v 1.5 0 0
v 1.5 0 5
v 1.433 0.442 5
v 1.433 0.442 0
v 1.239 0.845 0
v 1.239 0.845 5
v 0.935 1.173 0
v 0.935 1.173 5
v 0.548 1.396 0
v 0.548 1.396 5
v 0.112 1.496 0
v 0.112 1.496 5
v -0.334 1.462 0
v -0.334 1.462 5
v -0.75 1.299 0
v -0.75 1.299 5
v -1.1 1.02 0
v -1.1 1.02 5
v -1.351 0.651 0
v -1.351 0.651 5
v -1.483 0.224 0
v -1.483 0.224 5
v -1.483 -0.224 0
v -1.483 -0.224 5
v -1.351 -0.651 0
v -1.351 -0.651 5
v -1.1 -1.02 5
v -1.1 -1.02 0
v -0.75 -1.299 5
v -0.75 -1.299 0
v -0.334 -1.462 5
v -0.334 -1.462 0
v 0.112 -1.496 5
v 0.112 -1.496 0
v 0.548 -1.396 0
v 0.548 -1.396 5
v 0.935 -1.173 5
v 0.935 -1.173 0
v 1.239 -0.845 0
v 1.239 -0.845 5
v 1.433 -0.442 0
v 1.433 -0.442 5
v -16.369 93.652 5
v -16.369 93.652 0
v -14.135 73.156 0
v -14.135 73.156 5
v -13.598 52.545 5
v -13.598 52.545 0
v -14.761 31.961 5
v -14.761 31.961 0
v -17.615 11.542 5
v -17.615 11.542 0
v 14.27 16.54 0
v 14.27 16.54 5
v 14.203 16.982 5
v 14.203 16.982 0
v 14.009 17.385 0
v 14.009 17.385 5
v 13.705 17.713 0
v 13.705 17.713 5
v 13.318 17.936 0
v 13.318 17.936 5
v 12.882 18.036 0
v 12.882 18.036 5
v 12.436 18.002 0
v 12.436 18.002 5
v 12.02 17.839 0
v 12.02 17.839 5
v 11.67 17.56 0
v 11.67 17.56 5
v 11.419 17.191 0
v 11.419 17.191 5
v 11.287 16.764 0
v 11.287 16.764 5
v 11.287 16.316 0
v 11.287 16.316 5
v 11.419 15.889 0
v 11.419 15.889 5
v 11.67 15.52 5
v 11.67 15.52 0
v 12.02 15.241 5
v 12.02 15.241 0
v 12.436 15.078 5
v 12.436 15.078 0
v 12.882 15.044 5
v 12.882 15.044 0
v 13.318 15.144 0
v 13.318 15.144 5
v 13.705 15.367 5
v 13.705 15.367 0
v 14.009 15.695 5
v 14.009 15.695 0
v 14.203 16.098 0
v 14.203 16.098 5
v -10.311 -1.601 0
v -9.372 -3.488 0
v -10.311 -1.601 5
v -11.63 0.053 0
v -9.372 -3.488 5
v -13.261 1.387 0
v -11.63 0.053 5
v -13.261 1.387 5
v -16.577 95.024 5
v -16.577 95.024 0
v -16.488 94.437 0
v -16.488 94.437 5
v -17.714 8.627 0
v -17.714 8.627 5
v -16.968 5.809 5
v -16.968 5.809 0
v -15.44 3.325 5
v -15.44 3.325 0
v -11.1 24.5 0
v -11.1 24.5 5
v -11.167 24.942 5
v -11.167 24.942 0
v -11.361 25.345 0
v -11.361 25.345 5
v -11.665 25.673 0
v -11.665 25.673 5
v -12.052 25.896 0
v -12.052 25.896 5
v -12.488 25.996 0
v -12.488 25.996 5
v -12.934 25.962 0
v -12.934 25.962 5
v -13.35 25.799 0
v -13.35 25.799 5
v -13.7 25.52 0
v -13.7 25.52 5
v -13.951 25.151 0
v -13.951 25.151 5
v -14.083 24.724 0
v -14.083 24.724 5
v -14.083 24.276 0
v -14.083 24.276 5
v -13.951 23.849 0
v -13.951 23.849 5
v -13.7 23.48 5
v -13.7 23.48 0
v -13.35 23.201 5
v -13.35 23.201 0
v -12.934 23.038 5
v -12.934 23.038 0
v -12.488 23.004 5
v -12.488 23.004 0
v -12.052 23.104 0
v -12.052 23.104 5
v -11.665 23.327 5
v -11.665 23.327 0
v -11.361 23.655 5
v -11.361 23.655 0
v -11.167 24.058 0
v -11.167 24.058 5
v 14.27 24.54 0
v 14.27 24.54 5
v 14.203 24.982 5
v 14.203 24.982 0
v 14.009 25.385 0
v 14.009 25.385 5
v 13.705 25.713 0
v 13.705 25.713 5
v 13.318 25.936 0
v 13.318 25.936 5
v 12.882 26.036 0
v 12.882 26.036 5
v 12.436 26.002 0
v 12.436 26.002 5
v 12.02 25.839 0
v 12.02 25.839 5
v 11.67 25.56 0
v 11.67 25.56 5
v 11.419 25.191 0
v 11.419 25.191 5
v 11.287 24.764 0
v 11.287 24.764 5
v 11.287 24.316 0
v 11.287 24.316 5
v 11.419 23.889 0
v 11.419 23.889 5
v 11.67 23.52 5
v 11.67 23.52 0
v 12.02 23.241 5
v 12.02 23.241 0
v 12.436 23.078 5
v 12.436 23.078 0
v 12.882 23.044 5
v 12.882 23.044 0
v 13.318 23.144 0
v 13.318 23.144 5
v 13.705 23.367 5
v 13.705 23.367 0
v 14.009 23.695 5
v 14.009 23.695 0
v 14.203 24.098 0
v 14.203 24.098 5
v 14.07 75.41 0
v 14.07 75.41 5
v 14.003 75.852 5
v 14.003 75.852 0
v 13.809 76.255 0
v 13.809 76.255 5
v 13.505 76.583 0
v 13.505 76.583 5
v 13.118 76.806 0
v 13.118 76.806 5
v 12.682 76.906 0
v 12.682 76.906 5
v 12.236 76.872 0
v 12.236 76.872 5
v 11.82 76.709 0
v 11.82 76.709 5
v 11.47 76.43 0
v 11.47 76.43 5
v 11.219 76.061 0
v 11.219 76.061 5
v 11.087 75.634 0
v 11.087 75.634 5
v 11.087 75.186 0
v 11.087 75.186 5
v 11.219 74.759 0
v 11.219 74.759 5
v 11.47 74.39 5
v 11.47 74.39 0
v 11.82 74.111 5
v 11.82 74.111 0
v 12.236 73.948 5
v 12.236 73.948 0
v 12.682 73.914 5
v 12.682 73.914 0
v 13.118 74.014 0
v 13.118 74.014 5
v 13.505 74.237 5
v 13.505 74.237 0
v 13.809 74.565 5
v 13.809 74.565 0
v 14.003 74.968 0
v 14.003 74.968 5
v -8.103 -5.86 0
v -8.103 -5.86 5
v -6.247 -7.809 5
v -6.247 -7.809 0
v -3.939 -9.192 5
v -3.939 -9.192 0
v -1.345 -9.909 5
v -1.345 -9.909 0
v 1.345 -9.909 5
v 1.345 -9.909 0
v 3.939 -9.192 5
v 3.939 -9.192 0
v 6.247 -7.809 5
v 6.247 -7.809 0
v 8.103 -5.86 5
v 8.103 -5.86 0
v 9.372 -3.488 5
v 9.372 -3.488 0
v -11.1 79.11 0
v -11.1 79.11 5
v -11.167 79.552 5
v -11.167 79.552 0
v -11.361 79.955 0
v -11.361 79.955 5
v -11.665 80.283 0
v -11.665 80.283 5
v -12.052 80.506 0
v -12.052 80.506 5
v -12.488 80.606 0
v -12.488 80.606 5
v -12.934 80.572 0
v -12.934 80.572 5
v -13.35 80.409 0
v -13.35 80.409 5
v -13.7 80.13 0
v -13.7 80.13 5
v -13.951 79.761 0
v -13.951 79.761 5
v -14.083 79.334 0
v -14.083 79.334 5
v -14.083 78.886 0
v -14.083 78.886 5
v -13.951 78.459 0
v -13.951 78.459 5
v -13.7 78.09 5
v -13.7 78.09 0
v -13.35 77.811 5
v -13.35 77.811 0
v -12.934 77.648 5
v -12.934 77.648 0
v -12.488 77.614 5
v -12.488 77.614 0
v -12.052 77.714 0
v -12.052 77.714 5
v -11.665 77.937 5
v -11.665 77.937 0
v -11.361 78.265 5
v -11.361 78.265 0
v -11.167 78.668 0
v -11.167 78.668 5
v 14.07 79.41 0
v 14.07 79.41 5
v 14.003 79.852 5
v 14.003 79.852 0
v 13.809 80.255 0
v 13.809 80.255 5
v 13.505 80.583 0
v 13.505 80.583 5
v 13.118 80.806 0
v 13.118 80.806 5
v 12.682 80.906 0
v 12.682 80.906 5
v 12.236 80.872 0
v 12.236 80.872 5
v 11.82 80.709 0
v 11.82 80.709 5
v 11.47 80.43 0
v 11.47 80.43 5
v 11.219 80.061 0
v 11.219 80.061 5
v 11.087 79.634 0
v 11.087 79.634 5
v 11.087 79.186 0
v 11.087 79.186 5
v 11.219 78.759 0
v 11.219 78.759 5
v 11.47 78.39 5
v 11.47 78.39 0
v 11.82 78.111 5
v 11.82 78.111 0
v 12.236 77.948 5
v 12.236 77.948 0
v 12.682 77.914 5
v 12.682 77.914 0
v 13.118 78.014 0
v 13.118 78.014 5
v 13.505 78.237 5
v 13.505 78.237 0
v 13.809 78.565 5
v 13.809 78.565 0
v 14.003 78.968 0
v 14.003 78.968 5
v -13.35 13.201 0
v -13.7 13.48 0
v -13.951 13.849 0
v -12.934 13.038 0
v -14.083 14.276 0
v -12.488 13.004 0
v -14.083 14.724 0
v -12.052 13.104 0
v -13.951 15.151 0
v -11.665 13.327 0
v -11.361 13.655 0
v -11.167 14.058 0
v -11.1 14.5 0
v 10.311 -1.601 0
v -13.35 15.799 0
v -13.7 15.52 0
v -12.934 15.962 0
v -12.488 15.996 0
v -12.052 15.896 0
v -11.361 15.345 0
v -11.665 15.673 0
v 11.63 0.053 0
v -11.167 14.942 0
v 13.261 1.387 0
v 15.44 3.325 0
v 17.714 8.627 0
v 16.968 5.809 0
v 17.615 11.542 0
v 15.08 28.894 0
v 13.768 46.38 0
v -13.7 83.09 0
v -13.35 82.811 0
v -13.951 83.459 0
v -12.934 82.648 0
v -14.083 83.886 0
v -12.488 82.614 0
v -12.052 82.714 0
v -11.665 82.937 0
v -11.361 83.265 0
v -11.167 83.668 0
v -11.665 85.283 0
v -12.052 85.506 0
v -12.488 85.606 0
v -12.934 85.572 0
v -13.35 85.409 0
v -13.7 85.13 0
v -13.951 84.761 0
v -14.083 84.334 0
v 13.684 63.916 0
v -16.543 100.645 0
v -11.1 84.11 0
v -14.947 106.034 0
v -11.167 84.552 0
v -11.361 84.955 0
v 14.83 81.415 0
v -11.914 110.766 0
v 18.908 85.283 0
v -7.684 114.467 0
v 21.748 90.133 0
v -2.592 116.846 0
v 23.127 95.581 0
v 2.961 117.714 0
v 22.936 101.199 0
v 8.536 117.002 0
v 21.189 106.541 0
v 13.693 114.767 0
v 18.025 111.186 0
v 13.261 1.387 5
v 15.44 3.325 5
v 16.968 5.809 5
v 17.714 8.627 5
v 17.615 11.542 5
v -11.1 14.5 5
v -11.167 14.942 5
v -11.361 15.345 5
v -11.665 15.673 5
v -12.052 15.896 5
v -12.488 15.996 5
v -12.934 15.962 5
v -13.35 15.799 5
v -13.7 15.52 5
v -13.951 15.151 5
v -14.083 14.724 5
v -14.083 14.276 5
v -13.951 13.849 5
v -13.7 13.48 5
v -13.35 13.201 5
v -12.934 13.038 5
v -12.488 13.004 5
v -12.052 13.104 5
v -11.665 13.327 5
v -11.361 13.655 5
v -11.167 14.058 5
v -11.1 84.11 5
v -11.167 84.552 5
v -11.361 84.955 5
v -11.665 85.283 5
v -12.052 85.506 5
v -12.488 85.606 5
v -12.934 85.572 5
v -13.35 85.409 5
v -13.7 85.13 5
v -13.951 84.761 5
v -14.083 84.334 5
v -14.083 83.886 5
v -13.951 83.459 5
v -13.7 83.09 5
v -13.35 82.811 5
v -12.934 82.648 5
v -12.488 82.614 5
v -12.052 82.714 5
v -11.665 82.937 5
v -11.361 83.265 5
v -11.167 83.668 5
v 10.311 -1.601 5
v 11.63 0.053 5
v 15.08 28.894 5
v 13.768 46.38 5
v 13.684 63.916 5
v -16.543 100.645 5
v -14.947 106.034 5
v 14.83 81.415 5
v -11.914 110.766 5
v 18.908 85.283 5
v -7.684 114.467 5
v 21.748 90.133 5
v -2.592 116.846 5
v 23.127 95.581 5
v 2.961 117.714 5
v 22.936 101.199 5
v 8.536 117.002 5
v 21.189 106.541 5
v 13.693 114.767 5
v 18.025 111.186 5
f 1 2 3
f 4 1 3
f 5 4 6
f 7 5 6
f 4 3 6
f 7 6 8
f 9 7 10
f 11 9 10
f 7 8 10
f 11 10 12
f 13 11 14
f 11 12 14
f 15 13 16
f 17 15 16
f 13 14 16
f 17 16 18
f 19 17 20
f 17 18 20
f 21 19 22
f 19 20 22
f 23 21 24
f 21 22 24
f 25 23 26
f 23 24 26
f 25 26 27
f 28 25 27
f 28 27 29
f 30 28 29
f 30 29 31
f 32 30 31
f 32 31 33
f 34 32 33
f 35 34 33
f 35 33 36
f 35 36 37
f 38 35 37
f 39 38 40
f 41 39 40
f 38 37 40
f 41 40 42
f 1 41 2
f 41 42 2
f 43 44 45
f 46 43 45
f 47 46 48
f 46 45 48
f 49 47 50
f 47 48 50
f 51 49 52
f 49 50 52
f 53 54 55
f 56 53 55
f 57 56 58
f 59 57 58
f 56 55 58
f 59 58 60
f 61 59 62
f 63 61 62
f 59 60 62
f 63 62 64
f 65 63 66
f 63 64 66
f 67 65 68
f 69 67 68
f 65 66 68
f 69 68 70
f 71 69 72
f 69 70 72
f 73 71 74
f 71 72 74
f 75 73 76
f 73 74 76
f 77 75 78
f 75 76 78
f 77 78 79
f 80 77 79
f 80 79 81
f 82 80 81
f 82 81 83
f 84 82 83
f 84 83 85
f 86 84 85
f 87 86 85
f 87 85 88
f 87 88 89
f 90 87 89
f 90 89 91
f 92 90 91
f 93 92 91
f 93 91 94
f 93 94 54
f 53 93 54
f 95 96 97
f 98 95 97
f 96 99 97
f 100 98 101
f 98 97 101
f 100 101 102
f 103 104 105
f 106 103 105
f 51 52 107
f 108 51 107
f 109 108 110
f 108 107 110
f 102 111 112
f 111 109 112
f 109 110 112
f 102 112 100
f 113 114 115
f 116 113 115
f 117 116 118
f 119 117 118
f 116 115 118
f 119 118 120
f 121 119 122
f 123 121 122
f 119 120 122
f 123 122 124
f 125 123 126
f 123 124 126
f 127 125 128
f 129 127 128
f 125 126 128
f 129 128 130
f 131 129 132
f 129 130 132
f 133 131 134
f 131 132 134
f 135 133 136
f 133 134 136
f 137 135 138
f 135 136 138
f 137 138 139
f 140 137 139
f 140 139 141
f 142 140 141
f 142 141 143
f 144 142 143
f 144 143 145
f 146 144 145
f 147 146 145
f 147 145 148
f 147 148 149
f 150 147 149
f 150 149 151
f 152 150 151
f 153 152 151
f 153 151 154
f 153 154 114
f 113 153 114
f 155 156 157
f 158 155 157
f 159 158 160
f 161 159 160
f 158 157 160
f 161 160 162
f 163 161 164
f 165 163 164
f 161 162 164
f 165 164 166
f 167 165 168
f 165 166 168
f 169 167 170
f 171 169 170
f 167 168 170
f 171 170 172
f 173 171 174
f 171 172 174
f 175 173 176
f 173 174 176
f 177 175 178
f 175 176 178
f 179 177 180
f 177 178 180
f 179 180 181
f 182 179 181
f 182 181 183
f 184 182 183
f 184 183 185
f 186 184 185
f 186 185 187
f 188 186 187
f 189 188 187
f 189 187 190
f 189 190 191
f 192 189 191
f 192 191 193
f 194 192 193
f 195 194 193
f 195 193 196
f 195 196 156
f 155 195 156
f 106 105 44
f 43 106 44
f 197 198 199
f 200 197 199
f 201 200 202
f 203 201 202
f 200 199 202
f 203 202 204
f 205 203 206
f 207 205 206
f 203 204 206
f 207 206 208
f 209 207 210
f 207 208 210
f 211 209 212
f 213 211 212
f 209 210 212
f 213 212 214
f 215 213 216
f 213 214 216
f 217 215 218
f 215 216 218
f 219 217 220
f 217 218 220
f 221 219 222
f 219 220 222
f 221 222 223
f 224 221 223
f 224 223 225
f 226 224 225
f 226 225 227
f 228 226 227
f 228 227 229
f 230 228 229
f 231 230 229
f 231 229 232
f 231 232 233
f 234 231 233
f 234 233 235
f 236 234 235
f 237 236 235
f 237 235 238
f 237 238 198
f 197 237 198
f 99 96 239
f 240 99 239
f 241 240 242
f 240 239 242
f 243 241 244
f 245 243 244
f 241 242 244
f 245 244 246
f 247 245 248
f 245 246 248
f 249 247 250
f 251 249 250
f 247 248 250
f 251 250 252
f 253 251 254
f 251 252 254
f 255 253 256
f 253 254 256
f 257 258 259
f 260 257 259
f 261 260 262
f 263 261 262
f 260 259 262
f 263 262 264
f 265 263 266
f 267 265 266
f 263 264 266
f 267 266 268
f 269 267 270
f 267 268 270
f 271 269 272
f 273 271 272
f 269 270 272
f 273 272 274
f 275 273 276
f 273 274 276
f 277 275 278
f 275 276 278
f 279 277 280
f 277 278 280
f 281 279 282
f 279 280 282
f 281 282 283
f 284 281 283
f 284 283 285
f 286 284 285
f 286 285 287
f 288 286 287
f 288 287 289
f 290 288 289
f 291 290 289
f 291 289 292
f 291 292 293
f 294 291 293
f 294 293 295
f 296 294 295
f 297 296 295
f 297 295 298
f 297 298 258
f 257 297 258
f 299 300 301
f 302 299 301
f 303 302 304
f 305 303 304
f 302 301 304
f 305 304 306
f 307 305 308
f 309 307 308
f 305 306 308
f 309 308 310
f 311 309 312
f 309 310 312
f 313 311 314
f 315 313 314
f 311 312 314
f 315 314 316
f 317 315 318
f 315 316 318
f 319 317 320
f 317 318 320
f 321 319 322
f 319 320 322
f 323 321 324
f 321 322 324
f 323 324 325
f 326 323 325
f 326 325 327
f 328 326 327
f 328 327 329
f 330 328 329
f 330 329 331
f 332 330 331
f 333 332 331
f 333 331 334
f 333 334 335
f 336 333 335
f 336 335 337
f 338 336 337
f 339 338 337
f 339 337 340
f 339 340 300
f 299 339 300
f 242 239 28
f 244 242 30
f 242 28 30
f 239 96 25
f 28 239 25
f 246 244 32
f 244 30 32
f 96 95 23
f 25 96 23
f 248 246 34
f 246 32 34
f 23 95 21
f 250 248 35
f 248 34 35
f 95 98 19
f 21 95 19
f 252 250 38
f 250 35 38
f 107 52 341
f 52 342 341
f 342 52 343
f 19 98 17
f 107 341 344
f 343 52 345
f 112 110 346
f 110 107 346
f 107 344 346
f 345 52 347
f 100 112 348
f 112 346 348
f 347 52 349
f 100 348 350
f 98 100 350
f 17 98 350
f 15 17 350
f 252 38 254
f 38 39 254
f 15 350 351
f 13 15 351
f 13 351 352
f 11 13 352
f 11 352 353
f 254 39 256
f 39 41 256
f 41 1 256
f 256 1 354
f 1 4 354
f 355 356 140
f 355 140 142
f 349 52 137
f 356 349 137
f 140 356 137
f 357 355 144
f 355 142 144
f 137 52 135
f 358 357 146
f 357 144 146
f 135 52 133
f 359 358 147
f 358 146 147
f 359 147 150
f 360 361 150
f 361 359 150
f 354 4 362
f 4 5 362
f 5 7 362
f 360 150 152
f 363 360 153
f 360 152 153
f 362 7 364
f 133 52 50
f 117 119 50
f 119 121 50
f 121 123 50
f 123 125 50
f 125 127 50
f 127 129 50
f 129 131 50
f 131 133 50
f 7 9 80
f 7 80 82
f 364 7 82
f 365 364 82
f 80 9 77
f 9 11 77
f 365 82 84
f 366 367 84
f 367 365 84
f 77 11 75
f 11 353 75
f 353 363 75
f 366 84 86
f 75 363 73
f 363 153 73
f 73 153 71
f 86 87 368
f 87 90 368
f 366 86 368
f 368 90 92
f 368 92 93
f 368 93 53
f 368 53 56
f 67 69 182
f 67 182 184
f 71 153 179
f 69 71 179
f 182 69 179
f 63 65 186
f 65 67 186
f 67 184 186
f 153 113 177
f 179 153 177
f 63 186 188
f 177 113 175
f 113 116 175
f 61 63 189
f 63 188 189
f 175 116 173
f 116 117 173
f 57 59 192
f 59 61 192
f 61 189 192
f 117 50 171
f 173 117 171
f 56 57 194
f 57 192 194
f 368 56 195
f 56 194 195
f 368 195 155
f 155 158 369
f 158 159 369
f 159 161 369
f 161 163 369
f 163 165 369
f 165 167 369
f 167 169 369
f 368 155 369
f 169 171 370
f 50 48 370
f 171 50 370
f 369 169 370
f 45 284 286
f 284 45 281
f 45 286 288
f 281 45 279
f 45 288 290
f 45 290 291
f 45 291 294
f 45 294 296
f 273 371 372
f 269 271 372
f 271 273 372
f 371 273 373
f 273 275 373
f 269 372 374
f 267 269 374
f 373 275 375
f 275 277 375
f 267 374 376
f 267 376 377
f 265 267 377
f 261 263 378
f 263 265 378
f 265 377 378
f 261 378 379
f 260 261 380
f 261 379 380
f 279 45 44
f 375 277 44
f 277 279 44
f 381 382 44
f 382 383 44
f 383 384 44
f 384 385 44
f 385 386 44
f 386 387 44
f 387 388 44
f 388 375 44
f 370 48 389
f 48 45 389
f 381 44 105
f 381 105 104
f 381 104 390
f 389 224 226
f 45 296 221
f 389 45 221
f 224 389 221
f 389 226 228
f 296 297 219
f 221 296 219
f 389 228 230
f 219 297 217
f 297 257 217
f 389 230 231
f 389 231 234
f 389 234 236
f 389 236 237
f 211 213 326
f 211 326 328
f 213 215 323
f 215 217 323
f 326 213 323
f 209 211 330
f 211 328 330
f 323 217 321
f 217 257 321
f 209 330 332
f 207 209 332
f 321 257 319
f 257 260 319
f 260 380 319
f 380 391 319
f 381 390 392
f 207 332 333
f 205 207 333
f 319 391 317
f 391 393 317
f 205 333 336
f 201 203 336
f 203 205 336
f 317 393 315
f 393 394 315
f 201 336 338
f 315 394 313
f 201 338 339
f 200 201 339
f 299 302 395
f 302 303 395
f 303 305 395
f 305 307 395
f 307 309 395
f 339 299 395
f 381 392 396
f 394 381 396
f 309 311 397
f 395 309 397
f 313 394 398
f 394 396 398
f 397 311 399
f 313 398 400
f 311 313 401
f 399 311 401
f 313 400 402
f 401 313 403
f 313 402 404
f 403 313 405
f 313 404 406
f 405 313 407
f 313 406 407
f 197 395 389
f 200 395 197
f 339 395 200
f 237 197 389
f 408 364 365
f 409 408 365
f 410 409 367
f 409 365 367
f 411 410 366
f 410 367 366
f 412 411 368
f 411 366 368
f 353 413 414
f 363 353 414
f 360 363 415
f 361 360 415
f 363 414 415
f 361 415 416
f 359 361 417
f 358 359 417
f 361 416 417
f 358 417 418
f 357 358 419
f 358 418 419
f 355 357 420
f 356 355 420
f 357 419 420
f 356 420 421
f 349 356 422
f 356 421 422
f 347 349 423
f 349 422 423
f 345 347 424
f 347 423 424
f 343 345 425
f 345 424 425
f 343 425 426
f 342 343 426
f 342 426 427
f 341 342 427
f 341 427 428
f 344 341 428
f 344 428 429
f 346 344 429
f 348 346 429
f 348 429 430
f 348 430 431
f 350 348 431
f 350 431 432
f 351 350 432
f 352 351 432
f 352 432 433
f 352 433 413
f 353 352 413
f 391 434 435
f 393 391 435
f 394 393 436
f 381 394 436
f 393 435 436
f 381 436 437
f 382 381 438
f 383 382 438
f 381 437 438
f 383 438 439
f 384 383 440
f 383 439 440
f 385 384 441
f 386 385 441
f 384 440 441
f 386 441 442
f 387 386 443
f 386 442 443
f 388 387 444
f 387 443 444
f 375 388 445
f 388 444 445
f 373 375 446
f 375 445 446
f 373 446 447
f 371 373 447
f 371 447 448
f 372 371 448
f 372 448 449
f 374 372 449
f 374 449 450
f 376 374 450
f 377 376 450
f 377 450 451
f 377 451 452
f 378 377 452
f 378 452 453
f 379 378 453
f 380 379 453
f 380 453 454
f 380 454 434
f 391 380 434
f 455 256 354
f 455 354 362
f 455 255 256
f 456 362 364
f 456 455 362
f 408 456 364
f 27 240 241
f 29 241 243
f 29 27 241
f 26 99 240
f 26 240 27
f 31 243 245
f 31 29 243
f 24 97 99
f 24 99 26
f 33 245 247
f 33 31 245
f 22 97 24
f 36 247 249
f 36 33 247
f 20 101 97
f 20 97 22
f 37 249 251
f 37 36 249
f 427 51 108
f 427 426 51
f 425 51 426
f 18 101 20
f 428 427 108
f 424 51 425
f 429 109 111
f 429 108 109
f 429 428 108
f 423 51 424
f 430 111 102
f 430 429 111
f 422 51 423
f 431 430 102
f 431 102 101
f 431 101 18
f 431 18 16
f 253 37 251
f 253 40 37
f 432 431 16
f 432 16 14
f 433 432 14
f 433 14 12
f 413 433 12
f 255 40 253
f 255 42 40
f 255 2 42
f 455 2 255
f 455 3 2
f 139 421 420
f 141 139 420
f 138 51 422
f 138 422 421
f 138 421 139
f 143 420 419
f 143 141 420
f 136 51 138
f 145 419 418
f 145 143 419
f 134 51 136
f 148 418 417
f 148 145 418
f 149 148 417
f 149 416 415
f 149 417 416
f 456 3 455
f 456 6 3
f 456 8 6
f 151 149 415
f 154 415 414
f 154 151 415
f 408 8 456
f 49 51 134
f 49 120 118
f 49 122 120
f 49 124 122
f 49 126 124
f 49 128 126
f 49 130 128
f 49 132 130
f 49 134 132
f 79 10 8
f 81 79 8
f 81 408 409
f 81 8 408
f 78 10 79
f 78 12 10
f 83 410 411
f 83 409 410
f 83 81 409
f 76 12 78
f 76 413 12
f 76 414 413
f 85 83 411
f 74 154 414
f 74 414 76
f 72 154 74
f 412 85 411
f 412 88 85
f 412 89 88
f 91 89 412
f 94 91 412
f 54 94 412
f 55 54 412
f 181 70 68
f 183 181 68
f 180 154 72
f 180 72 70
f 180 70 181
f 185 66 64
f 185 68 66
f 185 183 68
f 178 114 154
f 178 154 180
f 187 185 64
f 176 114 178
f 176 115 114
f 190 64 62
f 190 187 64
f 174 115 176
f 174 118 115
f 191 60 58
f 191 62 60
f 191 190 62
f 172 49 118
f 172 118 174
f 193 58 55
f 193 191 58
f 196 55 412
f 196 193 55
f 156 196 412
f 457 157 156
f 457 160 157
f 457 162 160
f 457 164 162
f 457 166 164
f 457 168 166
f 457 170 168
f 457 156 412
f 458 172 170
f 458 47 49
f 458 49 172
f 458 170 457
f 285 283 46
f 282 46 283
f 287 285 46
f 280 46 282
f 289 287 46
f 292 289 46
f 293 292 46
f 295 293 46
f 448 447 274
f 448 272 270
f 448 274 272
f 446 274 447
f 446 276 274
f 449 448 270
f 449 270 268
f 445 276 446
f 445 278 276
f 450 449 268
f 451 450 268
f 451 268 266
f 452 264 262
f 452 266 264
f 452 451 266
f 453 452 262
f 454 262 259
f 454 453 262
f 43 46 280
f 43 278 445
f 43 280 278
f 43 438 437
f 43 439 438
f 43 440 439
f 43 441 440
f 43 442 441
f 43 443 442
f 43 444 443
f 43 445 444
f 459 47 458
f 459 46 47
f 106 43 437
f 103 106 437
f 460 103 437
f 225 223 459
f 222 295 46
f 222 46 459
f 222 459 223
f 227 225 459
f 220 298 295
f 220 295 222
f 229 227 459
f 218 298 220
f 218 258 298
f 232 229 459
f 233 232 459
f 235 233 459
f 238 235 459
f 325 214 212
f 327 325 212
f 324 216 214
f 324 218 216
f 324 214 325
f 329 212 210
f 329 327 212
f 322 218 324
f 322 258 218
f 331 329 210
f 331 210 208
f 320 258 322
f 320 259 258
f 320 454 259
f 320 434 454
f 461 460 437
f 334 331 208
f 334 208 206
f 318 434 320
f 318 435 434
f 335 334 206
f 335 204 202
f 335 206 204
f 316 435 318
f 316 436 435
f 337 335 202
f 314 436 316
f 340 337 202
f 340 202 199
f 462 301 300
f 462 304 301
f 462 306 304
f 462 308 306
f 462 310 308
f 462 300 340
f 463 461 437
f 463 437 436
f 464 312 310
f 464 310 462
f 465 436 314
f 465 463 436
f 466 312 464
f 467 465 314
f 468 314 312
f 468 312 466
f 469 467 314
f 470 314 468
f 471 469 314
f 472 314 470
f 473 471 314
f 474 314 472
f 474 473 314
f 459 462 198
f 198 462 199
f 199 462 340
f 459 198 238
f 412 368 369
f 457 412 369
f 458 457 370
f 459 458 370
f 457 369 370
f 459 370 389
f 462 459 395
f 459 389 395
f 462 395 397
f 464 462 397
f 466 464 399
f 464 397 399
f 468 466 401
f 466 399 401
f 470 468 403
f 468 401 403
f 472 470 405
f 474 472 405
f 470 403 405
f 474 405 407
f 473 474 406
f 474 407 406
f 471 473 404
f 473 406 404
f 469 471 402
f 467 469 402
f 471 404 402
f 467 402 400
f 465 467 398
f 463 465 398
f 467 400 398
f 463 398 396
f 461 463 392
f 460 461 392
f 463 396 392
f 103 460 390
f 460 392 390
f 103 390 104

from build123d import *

# Parameters (mm, degrees)
RESSALTO_EXTRUS_O1_DEPTH = 5
FILETE3_R                = 10
FILETE4_R                = 10
ESBO_O2_R                = 1.5
CORTE_EXTRUS_O1_DEPTH    = 5
ESBO_O3_R                = 1.5
CORTE_EXTRUS_O2_DEPTH    = 121.092170275
ESBO_O4_R                = 1.5
CORTE_EXTRUS_O3_DEPTH    = 10


with BuildPart() as part:
    # Esboço1 → Ressalto-extrusão1 (new body)
    with BuildSketch(Plane.XY):
        with BuildLine():
            ThreePointArc((-10, 0), (0, -10), (10, 0))
            Line((10, 0), (20, 0))
            ThreePointArc((20, 0), (14.071698091, 40.495175194), (14.829943665, 81.414963086))
            ThreePointArc((14.829943665, 81.414963086), (11.193742071, 116.066691762), (-16.576524471, 95.024435265))
            Line((-16.576524471, 95.024435265), (-16.487894969, 94.437265709))
            Line((-16.487894969, 94.437265709), (-16.369382775, 93.652123615))
            ThreePointArc((-16.369382775, 93.652123615), (-13.756795166, 46.654405302), (-20, 0))
            Line((-20, 0), (-10, 0))
        make_face()
    extrude(amount=RESSALTO_EXTRUS_O1_DEPTH)

    # Filete3
    # the kernel refuses this fillet: 10 mm, written as the material it takes off along each edge
    with BuildSketch(Plane(origin=(20, 0, -29.463728433), x_dir=(-0.20232831186330175, 0.9793177493635794, 0), z_dir=(0, 0, 1))) as filete3_piece_1:
        with BuildLine():
            CenterArc((12.021201201, 9.997221658), FILETE3_R, 181.169168083, 87.480189)
            Line((2.023283119, 9.793177494), (1.823324757, 9.78909661))
            ThreePointArc((1.823324757, 9.78909661), (0.815778009, 4.937054409), (-0.19586355, 0.040465662))
            Line((-0.19586355, 0.040465662), (0.004714197, -0.199944433))
            ThreePointArc((0.004714197, -0.199944433), (5.892745687, -0.130541448), (11.780777177, -0.199944433))
            Line((11.780777177, -0.199944433), (11.785491373, 0))
        make_face()
    extrude(amount=63.927456867, mode=Mode.SUBTRACT)
    with BuildSketch(Plane(origin=(-20, 0, -29.463728433), x_dir=(1, 0, 0), z_dir=(0, 0, 1))) as filete3_piece_2:
        with BuildLine():
            CenterArc((12.222685959, 9.749854723), FILETE3_R, 169.67749742, 87.480189)
            Line((2.384538574, 11.541740887), (2.187775626, 11.57757861))
            ThreePointArc((2.187775626, 11.57757861), (1.06442773, 5.797282674), (-0.194855317, 0.045071116))
            Line((-0.194855317, 0.045071116), (0, -0.2))
            ThreePointArc((0, -0.2), (5, -0.2), (9.955546281, -0.194997094))
            Line((9.955546281, -0.194997094), (10, 0))
        make_face()
    extrude(amount=63.927456867, mode=Mode.SUBTRACT)

    # Filete4
    filete4_edges = [part.edges().sort_by_distance(p)[0] for p in [
        (10, 0, 2.5),
        (-10, 0, 2.5),
    ]]
    fillet(filete4_edges, radius=FILETE4_R)

    # Esboço2 → Corte-extrusão1 (cut)
    with BuildSketch(Plane.XY.offset(5)):
        Circle(ESBO_O2_R)
    extrude(amount=-CORTE_EXTRUS_O1_DEPTH, mode=Mode.SUBTRACT)

    # Esboço3 → Corte-extrusão2 (cut, through all)
    with BuildSketch(Plane.XY.offset(5)):
        with Locations((-12.6, 14.5)):
            Circle(ESBO_O3_R)
        with Locations((-12.6, 24.5)):
            Circle(ESBO_O3_R)
        with Locations((-12.6, 79.11)):
            Circle(ESBO_O3_R)
        with Locations((-12.6, 84.11)):
            Circle(ESBO_O3_R)
    extrude(amount=-CORTE_EXTRUS_O2_DEPTH, mode=Mode.SUBTRACT)

    # Esboço4 → Corte-extrusão3 (cut)
    with BuildSketch(Plane.XY.offset(5)):
        with Locations((12.57, 79.41)):
            Circle(ESBO_O4_R)
        with Locations((12.57, 75.41)):
            Circle(ESBO_O4_R)
        with Locations((12.77, 24.54)):
            Circle(ESBO_O4_R)
        with Locations((12.77, 16.54)):
            Circle(ESBO_O4_R)
    extrude(amount=-CORTE_EXTRUS_O3_DEPTH, mode=Mode.SUBTRACT)


solid = part.part
